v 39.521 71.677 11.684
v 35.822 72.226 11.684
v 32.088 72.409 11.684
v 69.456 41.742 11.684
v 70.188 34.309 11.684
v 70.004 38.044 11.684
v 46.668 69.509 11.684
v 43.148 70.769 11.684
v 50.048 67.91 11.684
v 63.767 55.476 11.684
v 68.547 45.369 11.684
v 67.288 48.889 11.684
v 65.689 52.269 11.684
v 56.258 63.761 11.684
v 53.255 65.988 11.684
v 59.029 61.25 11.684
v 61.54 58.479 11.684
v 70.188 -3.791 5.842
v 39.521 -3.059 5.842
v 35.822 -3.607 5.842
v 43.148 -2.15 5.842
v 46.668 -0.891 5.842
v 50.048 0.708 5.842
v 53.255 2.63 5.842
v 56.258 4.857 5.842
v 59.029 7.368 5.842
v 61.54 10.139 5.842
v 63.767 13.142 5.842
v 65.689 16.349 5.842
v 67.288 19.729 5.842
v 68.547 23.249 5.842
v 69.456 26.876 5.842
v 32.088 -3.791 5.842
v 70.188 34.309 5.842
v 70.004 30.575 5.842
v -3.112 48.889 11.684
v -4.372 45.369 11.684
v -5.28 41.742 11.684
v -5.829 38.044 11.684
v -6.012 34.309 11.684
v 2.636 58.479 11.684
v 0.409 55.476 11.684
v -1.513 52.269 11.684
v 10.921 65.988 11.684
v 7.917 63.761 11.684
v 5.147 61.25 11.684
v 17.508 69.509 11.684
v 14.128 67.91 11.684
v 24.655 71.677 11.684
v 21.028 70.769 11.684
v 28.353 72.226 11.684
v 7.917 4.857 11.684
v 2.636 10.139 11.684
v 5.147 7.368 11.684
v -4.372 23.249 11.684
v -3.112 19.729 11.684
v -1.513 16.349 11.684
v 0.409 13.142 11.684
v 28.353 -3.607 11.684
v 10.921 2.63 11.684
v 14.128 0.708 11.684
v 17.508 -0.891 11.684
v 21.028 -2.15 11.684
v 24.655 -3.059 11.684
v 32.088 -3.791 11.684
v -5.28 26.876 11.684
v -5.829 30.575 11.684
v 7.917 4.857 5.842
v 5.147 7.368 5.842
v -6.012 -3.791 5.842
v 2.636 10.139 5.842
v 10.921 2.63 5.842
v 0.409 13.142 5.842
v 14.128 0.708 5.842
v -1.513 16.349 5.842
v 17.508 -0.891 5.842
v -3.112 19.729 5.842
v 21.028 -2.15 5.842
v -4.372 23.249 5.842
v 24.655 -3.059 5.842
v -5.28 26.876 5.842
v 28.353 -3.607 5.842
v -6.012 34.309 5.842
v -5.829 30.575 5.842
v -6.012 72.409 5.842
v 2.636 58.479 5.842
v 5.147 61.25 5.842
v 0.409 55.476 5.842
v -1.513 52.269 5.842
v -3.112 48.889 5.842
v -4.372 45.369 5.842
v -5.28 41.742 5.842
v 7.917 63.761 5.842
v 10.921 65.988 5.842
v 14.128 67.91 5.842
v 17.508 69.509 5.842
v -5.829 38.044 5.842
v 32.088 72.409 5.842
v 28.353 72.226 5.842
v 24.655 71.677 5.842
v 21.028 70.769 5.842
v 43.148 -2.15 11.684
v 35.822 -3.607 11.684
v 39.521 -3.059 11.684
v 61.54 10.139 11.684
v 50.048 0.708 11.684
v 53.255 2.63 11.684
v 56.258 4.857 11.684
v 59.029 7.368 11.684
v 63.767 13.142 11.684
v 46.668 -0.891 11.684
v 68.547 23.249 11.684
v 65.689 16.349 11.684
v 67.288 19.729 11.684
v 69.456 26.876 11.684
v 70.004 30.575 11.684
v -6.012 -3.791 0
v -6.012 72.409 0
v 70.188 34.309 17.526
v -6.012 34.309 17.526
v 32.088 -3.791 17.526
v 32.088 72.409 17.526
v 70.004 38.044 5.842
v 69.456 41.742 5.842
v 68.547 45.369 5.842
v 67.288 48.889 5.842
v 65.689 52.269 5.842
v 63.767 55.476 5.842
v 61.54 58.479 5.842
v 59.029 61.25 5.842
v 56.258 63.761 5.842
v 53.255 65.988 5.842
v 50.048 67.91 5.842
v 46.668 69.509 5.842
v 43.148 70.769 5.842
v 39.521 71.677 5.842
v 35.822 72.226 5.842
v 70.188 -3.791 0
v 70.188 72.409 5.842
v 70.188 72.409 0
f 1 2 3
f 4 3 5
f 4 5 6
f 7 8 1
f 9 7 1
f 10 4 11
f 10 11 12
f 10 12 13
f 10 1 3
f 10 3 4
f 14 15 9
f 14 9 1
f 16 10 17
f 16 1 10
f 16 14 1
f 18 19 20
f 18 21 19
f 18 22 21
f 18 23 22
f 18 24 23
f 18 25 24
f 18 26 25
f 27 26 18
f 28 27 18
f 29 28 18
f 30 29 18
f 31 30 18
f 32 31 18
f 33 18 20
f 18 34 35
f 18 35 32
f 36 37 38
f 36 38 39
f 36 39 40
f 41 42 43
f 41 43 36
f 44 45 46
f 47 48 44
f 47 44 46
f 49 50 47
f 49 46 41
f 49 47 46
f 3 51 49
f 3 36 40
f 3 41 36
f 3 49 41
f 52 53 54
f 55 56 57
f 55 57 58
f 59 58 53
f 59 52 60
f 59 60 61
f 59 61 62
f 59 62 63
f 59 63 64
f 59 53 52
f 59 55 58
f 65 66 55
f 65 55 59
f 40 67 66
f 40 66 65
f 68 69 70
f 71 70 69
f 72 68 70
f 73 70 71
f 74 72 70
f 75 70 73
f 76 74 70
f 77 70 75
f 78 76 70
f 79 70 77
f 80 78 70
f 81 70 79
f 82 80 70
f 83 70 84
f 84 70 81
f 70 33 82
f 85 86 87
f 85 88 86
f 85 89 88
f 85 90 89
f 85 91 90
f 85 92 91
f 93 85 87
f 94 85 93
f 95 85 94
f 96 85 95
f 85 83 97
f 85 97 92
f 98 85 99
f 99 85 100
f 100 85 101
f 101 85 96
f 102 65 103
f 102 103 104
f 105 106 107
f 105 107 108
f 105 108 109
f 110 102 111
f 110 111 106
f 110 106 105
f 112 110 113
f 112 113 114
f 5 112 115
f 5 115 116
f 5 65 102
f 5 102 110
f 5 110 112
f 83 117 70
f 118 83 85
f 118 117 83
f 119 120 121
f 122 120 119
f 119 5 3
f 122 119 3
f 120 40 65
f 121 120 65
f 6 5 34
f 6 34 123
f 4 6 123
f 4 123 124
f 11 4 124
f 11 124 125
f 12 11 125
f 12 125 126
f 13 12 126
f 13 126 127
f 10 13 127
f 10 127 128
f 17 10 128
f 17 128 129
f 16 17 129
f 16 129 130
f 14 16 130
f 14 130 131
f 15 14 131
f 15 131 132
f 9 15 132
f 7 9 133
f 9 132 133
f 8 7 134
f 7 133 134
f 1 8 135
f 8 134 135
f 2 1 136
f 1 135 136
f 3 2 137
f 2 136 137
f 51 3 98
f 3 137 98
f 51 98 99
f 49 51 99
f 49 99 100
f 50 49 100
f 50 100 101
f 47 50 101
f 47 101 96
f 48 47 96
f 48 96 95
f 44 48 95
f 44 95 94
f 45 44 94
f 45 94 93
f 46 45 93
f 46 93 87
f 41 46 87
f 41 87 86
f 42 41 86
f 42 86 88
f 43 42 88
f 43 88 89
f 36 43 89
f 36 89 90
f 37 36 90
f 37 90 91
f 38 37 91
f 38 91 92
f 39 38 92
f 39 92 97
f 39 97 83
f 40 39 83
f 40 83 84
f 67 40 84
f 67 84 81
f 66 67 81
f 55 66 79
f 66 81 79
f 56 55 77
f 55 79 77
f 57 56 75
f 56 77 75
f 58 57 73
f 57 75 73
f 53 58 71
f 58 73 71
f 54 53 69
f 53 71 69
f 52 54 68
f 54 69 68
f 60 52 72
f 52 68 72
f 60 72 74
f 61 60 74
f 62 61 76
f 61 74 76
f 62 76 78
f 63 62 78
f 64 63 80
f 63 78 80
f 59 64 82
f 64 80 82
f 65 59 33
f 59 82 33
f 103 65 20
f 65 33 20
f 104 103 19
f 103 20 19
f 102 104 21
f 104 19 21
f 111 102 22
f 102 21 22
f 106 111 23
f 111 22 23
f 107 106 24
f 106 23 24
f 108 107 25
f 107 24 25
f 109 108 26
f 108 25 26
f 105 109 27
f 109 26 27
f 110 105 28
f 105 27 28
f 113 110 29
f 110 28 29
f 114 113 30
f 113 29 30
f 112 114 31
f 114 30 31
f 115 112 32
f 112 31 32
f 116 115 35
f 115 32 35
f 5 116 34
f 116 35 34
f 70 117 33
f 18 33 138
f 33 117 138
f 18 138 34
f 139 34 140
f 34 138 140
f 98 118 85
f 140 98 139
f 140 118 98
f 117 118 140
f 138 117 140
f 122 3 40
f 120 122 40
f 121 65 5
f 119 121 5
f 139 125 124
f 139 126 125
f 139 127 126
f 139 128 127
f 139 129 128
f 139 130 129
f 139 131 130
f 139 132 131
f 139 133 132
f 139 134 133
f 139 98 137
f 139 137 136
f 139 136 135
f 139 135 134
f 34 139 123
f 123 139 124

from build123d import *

# Parameters (mm, degrees)
F0_W     = 76.2
F0_H     = 76.2
F1_DEPTH = 5.842
F2_R     = 38.1
F3_DEPTH = 5.842
F5_DEPTH = 5.842


with BuildPart() as f1:
    # F0 (on Top) → F1 (new body)
    with BuildSketch(Plane.XY):
        with Locations((32.087865, 34.309075)):
            Rectangle(F0_W, F0_H)
    extrude(amount=F1_DEPTH)

    # F2 (on face) → F3 (join)
    with BuildSketch(Plane.XY.offset(5.842)):
        with Locations((32.087865, 34.309075)):
            Circle(F2_R)
    extrude(amount=F3_DEPTH)

    # F4 (on face) → F5 (join)
    with BuildSketch(Plane.XY.offset(11.684)):
        Polygon((70.187865, 34.309075), (32.087865, 72.409075), (-6.012135, 34.309075), (32.087865, -3.790925), align=None)
    extrude(amount=F5_DEPTH)


solid = f1.part
